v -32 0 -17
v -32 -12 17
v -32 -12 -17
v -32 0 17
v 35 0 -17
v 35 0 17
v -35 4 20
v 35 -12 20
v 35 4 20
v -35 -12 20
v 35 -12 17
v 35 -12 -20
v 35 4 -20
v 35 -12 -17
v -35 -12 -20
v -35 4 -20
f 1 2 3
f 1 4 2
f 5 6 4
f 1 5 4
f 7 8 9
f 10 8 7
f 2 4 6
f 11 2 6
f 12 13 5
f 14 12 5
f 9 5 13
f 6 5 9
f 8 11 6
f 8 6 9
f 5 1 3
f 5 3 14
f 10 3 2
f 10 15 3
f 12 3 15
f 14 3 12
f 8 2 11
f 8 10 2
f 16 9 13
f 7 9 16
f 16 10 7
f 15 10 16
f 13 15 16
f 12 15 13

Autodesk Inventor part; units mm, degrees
ref_plane "YZ Plane" through (0, 0, 0) normal (1, 0, 0) x (0, 1, 0)
ref_plane "XZ Plane" through (0, 0, 0) normal (0, 1, 0) x (-1, 0, 0)
ref_plane "XY Plane" through (0, 0, 0) normal (0, 0, 1) x (1, 0, 0)
sketch "Эскиз1" plane through (0, 0, 0) normal (0, 1, 0) x (-1, 0, 0)
  line L0 (-35, 20) -> (35, 20)
  line L1 (35, 20) -> (35, -20)
  line L2 (35, -20) -> (-35, -20)
  line L3 (-35, -20) -> (-35, 20)
  line L4 (-35, 20) -> (35, -20) construction
  line L5 (35, 20) -> (-35, -20) construction
  point P0 (0, 0)
  dimension "d0" = 40
  dimension "d1" = 70
extrude "Выдавливание1" add sketch "Эскиз1" along normal blind 4
sketch "Эскиз2" plane through (0, 0, 0) normal (0, -1, 0) x (1, 0, 0)
  line L0 (-35, 20) -> (35, 20) projected
  line L1 (35, 20) -> (-35, 20)
  line L2 (-35, 20) -> (-35, 17)
  line L3 (-35, 17) -> (35, 17)
  line L4 (35, 17) -> (35, 20)
  line L5 (35, -20) -> (-35, -20) projected
  line L6 (35, -20) -> (-35, -20)
  line L7 (-35, -20) -> (-35, -17)
  line L8 (-35, -17) -> (35, -17)
  line L9 (35, -17) -> (35, -20)
  line L10 (-35, -20) -> (-35, 20) projected
  line L11 (-35, 17) -> (-32, 17)
  line L12 (-32, 17) -> (-32, -17)
  line L13 (-32, -17) -> (-35, -17)
  line L14 (-35, -17) -> (-35, 17)
  point P0 (0, 0)
  dimension "d4" = 3
extrude "Выдавливание2" add sketch "Эскиз2" along normal blind 12
properties part number "Battery box under the board"
